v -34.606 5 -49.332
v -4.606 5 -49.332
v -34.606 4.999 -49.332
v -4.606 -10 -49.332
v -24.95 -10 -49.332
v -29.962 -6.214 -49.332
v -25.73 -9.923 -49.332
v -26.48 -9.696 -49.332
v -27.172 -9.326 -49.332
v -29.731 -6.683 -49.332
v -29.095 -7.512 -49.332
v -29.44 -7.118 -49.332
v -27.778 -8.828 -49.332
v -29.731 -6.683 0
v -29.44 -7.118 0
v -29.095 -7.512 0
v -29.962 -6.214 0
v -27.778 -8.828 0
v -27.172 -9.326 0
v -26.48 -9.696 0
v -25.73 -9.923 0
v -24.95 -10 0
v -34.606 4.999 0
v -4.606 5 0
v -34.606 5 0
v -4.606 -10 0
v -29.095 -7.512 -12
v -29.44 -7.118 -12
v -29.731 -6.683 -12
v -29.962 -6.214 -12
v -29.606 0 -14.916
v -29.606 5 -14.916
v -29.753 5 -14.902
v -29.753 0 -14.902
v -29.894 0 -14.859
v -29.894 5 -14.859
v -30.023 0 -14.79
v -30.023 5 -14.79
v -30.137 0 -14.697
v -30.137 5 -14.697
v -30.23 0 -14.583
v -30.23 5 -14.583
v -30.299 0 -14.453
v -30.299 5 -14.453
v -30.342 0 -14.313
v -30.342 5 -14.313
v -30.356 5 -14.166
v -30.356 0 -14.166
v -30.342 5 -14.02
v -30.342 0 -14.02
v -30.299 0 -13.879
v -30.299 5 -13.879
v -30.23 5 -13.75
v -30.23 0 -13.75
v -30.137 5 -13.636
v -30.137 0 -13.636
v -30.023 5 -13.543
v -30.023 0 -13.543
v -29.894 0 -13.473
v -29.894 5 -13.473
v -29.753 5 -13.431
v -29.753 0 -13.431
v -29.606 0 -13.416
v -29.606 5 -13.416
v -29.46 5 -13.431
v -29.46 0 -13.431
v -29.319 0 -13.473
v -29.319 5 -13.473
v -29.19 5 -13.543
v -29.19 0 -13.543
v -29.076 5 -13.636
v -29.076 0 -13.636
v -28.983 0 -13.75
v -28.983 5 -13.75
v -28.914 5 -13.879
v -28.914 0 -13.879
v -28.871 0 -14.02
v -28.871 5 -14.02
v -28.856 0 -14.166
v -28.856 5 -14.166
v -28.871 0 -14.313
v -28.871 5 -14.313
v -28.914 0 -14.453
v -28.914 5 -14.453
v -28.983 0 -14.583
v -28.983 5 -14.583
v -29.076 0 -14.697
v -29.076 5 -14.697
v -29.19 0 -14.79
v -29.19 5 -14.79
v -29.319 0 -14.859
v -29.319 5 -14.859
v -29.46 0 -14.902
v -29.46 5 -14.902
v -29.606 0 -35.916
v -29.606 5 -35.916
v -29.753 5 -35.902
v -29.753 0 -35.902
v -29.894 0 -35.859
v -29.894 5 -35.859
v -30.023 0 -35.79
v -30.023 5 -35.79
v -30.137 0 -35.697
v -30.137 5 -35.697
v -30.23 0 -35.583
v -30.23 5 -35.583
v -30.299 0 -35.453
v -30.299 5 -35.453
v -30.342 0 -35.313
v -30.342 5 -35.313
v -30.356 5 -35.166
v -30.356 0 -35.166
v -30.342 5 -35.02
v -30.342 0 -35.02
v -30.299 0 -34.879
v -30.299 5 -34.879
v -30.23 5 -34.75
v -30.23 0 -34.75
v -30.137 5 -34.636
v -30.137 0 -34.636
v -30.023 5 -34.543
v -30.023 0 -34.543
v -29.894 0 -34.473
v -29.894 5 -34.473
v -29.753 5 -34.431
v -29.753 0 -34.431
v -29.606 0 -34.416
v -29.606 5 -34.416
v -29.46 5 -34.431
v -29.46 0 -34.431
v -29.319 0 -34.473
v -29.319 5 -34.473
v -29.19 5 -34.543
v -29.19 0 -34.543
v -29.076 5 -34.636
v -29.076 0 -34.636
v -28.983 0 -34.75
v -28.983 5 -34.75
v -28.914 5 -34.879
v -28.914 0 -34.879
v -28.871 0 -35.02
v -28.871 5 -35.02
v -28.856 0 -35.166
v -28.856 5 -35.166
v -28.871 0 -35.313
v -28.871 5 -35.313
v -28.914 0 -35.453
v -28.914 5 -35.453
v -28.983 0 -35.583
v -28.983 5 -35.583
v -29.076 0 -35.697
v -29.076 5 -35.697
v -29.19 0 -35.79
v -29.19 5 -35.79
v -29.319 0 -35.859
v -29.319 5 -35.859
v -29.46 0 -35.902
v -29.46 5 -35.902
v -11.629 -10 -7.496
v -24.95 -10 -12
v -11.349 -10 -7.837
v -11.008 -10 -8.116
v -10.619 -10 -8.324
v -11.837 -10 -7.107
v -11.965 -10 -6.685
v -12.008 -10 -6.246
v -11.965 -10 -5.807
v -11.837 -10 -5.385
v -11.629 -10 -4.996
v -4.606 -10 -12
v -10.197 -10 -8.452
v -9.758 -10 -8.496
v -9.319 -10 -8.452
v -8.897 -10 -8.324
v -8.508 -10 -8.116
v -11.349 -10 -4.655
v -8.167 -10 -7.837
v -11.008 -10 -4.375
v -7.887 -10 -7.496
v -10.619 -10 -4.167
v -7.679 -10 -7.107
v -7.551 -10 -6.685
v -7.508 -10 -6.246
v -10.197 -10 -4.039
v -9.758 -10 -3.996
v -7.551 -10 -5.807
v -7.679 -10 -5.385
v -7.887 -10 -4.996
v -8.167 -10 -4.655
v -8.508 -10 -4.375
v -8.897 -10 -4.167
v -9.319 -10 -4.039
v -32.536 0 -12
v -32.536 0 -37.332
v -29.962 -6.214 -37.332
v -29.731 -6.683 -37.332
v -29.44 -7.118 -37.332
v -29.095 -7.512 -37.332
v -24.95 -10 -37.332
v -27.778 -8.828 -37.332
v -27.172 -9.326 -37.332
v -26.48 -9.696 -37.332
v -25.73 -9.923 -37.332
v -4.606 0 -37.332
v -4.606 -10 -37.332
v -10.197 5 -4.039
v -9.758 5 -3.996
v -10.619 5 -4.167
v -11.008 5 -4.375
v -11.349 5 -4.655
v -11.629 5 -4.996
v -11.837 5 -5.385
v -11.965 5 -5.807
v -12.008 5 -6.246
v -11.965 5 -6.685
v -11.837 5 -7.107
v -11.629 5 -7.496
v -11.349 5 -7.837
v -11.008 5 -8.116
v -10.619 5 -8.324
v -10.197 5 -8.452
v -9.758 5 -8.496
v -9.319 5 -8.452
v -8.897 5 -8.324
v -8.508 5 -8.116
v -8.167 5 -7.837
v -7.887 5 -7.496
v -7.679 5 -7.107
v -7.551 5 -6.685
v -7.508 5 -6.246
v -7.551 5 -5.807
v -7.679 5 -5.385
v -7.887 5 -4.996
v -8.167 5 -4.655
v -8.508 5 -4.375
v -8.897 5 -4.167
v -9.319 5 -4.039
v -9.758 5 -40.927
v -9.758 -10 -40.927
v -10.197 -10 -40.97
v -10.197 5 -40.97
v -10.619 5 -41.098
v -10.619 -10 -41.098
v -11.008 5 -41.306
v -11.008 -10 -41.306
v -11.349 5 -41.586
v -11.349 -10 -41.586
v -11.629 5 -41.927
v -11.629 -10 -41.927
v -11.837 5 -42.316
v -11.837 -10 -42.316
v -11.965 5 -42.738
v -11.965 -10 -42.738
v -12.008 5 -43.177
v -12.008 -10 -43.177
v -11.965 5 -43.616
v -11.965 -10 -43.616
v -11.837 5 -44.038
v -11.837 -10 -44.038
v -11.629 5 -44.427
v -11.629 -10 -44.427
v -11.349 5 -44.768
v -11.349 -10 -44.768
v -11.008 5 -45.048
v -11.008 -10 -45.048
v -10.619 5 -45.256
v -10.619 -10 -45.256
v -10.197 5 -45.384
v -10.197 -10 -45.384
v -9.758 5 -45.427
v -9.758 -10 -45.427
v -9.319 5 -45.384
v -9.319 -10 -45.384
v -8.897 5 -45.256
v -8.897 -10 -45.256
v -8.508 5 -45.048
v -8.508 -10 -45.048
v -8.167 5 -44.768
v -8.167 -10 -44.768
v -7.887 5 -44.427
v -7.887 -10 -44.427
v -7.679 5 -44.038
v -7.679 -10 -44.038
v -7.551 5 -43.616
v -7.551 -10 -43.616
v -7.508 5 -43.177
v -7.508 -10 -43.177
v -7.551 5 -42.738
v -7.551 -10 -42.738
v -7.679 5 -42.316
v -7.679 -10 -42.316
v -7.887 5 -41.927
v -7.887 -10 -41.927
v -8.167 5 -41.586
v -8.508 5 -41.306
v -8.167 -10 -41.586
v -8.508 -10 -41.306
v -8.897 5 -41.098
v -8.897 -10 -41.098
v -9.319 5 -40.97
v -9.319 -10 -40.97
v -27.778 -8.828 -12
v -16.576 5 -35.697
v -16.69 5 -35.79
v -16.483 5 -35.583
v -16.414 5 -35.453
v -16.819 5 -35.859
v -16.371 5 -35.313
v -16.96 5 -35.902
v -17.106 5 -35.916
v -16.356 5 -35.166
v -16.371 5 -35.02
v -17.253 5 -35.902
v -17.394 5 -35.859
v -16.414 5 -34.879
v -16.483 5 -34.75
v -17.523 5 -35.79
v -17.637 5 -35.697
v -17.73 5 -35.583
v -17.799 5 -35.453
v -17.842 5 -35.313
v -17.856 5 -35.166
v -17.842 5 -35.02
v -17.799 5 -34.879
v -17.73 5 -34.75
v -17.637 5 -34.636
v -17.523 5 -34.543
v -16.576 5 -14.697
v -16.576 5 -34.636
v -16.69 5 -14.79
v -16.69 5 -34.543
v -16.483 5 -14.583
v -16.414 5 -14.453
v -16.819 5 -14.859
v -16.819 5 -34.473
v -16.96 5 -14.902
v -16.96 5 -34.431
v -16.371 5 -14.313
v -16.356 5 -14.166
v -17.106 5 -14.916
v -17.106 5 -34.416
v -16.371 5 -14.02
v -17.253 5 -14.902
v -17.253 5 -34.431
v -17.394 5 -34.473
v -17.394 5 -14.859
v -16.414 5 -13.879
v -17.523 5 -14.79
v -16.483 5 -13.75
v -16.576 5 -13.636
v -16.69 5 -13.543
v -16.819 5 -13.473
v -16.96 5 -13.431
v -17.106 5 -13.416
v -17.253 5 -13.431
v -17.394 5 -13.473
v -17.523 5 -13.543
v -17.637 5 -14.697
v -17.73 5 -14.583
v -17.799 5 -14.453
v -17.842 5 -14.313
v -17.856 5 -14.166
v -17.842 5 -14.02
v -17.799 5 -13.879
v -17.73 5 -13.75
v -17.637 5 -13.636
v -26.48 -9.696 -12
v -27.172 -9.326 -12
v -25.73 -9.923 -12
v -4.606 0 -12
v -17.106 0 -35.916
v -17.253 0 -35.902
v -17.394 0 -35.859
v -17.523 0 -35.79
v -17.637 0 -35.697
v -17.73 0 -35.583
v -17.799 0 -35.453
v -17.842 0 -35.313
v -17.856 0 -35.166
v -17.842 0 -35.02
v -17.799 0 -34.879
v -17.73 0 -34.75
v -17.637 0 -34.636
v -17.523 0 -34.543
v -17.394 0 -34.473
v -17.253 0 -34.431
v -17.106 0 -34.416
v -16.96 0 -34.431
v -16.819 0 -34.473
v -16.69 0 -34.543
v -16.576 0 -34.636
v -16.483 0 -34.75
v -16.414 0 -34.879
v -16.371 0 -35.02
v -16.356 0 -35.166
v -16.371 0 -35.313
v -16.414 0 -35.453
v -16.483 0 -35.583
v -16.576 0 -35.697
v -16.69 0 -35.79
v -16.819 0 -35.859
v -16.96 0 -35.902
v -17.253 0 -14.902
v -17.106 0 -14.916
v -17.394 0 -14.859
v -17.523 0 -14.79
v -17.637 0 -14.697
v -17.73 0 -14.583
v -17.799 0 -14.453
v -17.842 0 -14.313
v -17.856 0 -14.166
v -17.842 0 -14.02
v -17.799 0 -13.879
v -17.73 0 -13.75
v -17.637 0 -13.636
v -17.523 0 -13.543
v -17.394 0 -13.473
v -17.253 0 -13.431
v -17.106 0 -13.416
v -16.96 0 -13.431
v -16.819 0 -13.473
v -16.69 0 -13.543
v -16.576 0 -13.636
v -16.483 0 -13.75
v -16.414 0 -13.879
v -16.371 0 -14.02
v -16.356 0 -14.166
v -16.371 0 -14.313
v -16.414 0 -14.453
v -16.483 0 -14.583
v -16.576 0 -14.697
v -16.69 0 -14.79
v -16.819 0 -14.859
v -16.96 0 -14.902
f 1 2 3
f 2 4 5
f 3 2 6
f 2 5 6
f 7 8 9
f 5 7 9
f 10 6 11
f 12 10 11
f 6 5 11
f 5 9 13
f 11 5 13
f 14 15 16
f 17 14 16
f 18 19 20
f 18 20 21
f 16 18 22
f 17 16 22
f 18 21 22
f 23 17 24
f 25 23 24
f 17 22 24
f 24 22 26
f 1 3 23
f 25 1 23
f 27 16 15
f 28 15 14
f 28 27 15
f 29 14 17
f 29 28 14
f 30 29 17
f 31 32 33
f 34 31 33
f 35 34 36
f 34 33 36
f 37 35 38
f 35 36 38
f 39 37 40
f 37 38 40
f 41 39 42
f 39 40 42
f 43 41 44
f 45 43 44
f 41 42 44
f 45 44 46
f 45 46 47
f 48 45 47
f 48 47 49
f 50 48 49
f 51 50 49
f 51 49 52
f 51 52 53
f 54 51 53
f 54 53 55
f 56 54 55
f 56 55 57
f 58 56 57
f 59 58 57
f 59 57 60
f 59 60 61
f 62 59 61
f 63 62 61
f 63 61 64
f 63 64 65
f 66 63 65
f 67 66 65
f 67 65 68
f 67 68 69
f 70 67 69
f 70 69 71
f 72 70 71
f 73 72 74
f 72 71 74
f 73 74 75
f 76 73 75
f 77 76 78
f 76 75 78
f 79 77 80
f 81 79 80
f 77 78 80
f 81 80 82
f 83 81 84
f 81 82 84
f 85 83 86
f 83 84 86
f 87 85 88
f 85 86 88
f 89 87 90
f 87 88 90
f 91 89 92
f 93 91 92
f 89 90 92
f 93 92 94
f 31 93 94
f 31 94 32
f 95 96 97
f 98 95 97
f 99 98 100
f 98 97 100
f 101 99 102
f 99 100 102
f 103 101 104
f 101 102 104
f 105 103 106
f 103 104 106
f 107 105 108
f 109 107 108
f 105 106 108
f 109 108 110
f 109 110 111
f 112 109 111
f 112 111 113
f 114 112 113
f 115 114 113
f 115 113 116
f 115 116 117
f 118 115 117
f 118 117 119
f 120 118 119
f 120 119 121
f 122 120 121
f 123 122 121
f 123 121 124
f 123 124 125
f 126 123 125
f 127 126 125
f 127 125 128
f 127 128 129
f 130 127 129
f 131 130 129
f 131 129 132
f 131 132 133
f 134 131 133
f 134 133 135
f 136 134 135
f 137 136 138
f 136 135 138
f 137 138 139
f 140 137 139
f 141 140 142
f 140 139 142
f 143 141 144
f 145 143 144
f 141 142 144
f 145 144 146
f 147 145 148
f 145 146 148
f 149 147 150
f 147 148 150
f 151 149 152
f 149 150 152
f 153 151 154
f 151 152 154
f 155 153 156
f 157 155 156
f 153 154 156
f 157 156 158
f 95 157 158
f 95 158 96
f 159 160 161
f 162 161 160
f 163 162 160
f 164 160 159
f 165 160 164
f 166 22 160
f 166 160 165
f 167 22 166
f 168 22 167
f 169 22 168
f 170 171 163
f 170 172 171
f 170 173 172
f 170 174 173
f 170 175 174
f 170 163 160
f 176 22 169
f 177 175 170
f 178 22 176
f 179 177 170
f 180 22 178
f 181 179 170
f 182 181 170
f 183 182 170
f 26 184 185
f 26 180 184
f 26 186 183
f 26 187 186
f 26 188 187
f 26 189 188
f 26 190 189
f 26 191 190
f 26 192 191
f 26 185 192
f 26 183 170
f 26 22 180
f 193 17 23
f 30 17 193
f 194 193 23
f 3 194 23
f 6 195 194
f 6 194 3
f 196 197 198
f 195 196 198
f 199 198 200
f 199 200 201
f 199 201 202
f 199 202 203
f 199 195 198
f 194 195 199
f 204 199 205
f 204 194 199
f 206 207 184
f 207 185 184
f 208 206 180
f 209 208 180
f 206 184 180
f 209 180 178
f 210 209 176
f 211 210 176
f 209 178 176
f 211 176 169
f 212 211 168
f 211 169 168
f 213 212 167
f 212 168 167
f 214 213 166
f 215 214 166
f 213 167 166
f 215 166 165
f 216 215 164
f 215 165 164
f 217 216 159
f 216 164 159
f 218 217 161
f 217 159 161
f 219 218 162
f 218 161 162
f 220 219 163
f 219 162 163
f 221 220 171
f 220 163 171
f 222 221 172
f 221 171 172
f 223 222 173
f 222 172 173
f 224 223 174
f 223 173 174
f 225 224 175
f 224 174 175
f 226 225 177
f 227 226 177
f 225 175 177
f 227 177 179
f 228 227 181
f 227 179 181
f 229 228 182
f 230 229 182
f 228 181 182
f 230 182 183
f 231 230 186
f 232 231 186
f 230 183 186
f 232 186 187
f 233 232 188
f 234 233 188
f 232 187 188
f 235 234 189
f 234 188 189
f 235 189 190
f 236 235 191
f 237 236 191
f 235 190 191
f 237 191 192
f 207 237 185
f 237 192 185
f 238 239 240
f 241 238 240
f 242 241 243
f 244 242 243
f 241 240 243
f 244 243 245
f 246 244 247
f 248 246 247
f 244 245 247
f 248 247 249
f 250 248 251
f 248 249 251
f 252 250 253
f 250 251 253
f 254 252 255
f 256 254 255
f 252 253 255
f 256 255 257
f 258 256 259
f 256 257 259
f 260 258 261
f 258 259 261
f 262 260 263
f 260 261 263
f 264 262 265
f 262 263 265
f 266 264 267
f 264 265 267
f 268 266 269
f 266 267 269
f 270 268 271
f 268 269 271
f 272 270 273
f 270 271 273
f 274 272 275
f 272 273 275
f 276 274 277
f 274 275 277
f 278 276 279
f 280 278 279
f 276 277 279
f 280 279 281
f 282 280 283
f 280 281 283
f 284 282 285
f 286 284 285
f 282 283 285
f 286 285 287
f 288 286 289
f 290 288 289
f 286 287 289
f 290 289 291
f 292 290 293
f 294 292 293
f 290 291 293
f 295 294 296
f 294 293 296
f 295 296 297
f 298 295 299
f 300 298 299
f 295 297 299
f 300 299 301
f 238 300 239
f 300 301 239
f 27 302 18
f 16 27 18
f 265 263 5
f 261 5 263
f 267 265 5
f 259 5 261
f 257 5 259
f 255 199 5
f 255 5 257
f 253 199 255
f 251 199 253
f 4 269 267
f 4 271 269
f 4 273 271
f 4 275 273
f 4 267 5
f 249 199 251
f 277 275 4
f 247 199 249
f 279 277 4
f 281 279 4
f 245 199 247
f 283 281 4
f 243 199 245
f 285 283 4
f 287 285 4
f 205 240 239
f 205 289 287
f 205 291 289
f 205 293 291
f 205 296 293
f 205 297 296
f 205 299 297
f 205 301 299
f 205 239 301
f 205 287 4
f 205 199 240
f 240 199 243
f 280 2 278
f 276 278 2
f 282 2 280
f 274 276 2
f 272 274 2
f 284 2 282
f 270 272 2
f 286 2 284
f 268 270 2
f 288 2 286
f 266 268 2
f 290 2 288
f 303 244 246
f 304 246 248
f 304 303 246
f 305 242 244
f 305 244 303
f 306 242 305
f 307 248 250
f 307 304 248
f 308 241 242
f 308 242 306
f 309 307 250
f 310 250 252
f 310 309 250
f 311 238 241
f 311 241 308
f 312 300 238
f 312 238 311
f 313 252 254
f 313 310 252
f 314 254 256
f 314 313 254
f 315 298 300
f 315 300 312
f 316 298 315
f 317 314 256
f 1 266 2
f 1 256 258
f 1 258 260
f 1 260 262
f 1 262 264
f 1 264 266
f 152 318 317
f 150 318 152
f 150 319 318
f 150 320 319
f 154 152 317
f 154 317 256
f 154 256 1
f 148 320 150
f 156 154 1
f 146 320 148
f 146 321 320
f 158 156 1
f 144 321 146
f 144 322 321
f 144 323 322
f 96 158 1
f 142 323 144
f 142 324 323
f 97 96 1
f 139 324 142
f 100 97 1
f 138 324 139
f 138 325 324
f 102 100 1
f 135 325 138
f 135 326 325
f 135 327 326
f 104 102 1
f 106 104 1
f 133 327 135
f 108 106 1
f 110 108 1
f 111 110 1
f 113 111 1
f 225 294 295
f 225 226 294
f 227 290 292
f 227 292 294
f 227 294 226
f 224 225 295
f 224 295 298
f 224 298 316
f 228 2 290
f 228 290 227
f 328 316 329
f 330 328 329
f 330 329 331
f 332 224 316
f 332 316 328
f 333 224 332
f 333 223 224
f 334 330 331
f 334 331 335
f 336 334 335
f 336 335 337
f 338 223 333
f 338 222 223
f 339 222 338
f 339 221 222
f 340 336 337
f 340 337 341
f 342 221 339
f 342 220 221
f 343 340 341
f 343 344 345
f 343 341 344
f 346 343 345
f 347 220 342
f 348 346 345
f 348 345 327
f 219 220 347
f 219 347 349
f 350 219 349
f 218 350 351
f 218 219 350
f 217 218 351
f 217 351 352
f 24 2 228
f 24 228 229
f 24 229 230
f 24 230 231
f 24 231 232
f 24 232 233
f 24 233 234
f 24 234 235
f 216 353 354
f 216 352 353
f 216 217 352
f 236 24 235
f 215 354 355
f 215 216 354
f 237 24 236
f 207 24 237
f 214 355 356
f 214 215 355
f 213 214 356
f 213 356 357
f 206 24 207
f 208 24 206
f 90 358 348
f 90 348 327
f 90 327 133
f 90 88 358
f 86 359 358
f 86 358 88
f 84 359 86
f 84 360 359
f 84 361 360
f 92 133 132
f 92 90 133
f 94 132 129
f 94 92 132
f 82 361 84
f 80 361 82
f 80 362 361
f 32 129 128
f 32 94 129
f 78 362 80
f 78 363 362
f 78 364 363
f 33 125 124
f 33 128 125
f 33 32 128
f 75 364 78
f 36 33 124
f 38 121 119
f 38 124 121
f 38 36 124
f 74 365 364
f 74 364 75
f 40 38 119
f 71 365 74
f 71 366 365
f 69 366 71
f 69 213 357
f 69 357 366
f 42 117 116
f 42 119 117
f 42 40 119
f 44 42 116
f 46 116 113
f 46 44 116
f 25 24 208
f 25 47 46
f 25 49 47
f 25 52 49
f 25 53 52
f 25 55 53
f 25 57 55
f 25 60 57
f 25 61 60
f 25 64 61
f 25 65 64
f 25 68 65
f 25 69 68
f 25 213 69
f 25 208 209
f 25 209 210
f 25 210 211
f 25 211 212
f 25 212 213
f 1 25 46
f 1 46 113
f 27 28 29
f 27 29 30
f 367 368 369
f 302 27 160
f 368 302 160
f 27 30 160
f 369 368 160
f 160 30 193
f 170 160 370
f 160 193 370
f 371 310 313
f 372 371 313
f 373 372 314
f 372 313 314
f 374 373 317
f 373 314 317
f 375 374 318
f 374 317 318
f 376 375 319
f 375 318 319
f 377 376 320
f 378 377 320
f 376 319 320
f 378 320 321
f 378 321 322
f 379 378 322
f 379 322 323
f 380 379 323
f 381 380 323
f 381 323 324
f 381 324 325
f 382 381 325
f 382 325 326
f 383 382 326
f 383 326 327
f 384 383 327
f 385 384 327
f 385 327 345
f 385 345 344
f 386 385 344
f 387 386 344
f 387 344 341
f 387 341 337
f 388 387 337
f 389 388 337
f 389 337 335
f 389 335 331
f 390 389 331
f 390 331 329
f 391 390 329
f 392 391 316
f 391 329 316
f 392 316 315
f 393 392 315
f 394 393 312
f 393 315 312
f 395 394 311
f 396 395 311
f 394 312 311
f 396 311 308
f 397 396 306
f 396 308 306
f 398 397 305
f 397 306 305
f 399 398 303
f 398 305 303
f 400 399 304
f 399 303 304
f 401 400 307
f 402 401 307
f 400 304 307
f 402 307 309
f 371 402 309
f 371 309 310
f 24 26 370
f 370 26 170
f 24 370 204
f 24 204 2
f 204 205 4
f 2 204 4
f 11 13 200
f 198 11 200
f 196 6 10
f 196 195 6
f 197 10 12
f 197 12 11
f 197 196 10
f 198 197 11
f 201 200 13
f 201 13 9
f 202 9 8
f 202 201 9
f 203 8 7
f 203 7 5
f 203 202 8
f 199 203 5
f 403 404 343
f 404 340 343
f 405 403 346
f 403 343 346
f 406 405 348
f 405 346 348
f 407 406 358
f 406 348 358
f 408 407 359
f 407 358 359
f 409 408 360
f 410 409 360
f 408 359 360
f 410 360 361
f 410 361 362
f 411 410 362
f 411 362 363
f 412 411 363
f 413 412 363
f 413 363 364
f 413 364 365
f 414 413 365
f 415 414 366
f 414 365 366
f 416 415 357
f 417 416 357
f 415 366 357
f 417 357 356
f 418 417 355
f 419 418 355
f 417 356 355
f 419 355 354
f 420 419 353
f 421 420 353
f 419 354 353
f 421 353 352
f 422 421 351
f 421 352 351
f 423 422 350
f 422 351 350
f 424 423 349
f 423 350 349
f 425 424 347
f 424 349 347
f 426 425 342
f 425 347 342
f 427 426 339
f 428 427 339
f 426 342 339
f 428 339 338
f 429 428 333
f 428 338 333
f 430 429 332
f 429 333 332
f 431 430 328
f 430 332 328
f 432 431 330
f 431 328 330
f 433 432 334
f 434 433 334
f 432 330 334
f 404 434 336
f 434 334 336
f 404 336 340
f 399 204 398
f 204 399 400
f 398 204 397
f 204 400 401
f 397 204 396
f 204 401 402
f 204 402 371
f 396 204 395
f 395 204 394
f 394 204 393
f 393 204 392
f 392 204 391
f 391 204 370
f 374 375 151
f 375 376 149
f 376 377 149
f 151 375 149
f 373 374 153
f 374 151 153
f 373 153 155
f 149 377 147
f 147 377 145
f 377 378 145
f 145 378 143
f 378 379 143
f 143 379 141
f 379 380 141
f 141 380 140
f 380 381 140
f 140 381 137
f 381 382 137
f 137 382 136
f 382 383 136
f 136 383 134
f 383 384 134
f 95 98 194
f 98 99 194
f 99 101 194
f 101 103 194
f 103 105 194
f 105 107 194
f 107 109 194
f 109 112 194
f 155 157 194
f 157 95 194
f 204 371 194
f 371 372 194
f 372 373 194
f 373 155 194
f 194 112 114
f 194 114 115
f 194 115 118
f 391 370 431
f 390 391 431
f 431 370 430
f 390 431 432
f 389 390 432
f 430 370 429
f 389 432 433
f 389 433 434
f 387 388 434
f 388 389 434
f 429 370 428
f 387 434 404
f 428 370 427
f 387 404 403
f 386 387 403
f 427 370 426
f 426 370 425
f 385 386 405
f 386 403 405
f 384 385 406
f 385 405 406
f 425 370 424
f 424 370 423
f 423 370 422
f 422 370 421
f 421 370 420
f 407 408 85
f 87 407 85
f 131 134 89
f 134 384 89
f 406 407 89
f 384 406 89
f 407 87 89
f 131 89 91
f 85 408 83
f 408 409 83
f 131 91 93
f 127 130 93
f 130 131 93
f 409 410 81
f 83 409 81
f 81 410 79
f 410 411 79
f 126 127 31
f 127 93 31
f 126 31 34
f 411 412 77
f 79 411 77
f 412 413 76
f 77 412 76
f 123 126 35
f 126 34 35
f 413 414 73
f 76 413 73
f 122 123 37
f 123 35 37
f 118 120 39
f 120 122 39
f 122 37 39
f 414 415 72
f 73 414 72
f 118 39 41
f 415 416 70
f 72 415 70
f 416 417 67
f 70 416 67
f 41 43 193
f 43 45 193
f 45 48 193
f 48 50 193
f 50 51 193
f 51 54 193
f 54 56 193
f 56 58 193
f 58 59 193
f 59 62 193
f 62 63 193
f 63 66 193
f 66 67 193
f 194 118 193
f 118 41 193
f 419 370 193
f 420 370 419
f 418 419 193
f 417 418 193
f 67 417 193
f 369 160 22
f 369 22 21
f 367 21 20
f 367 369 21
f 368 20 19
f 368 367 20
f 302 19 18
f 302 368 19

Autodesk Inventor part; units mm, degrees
ref_plane "YZ Plane" through (0, 0, 0) normal (1, 0, 0) x (0, 1, 0)
ref_plane "XZ Plane" through (0, 0, 0) normal (0, 1, 0) x (-1, 0, 0)
ref_plane "XY Plane" through (0, 0, 0) normal (0, 0, 1) x (1, 0, 0)
sketch "Sketch1" plane through (0, 0, 0) normal (0, 1, 0) x (-1, 0, 0)
  circle A0 centre (9.758, -6.2456) radius 2.1174
  circle A1 centre (9.758, -6.2456) radius 2.1174
  circle A2 centre (9.758, -43.1772) radius 2.1174
  circle A3 centre (9.758, -43.1772) radius 2.1174
  line L0 (19.6065, 0) -> (19.6065, -49.3325)
  line L1 (19.6065, 0) -> (4.6065, 0)
  line L2 (4.6065, 0) -> (4.6065, -49.3325)
  line L3 (4.6065, -49.3325) -> (19.6065, -49.3325)
  line L4 (19.6065, -49.3325) -> (19.6065, 0)
  line L5 (4.6065, -49.3325) -> (4.6065, -54.3325)
  line L6 (19.6065, -49.3325) -> (34.6065, -49.3325)
  line L7 (34.6065, -49.3325) -> (34.6065, 0)
  line L8 (34.6065, 0) -> (19.6065, 0)
  line L9 (19.6065, 0) -> (19.6065, -49.3325)
  line L10 (34.6065, 0) -> (4.6065, -49.3325)
  line L11 (34.6065, -49.3325) -> (4.6065, 0)
  line L12 (7.6065, -37.1662) -> (31.6065, -37.1662)
  line L13 (31.6065, -37.1662) -> (31.6065, -12.1662)
  line L14 (31.6065, -12.1662) -> (7.6065, -12.1662)
  line L15 (7.6065, -12.1662) -> (7.6065, -37.1662)
  line L16 (7.6065, -37.1662) -> (31.6065, -12.1662) construction
  line L17 (31.6065, -37.1662) -> (7.6065, -12.1662) construction
  line L18 (17.1065, -14.1662) -> (29.6065, -14.1662)
  line L19 (29.6065, -14.1662) -> (29.6065, -35.1662)
  line L20 (29.6065, -35.1662) -> (17.1065, -35.1662)
  line L21 (17.1065, -35.1662) -> (17.1065, -14.1662)
  point P0 (0, 0)
  point P1 (19.6065, -49.3325)
  point P2 (-0.0904, -49.3325)
  point P3 (19.6065, -24.6662)
  dimension "d0" = 15
  dimension "d5" = 15
  dimension "d8" = 24
  dimension "d9" = 25
  dimension "d14" = 12.5
  dimension "d15" = 21
  dimension "d16" = 2
  dimension "d17" = 2
extrude "Extrusion1" add sketch "Sketch1" along normal blind 5 contours A0 L11 L1 L0 L14 | A0 L11 L14 L15 L12 L10 A2 L2 | L14 L0 L18 L21 L11 | L11 L21 L10 L12 L15 L14 | L8 L10 L14 L0 | L10 A2 L12 L0 L3 | L21 L18 L0 L11 | L11 L10 L21 | L14 L10 L18 L0 | L7 L11 L12 L13 L14 L10 | L0 L12 L11 L6 | L11 L20 L0 | L0 L18 L10 | L0 L20 L21 L10 | L10 L18 L19 L20 L11 | L21 L20 L0 L12 L10 | L14 L13 L12 L11 L20 L19 L18 L10 | L0 L20 L11 L12
hole "Hole1" at (0.0904, 0, -49.3325) at (-29.6065, 0, -35.1662) at (-29.6065, 0, -14.1662) at (-17.1065, 0, -35.1662) at (-17.1065, 0, -14.1662) direction (0, 1, 0) diameter 1.5 end through all
sketch "Sketch2" plane through (0, 0, 0) normal (0, -1, 0) x (1, 0, 0)
  line L0 (-4.6065, 0) -> (-34.6065, 0)
  line L1 (-34.6065, 0) -> (-34.6065, -12)
  line L2 (-34.6065, -12) -> (-4.6065, -12)
  line L3 (-4.6065, -12) -> (-4.6065, 0)
  line L4 (-4.6065, -49.3325) -> (-34.6065, -49.3325)
  line L5 (-34.6065, -49.3325) -> (-34.6065, -37.3325)
  line L6 (-34.6065, -37.3325) -> (-4.6065, -37.3325)
  line L7 (-4.6065, -37.3325) -> (-4.6065, -49.3325)
  point P0 (0, 0)
  dimension "d27" = 30
  dimension "d28" = 12
  dimension "d29" = 30
  dimension "d30" = 12
extrude "Extrusion2" add sketch "Sketch2" along normal blind 10
hole "Hole2" at (-9.758, 0, -6.2456) at (-9.758, 0, -43.1772) direction (0, -1, 0) diameter 4.5 end through all both
chamfer "Chamfer1" distance 8 angle 45 2 edges at (-34.6065, -10, -43.3325) (-34.6065, -10, -6)
chamfer "Chamfer2" distance 7 angle 45 2 edges at (-34.6065, -2, -43.3325) (-34.6065, -2, -6)
fillet "Fillet1" radius 4 4 edges at (-29.6574, -6.949, -6) (-26.6065, -10, -6) (-26.6065, -10, -43.3325) (-29.6574, -6.949, -43.3325)
properties part number "camera_holder"
